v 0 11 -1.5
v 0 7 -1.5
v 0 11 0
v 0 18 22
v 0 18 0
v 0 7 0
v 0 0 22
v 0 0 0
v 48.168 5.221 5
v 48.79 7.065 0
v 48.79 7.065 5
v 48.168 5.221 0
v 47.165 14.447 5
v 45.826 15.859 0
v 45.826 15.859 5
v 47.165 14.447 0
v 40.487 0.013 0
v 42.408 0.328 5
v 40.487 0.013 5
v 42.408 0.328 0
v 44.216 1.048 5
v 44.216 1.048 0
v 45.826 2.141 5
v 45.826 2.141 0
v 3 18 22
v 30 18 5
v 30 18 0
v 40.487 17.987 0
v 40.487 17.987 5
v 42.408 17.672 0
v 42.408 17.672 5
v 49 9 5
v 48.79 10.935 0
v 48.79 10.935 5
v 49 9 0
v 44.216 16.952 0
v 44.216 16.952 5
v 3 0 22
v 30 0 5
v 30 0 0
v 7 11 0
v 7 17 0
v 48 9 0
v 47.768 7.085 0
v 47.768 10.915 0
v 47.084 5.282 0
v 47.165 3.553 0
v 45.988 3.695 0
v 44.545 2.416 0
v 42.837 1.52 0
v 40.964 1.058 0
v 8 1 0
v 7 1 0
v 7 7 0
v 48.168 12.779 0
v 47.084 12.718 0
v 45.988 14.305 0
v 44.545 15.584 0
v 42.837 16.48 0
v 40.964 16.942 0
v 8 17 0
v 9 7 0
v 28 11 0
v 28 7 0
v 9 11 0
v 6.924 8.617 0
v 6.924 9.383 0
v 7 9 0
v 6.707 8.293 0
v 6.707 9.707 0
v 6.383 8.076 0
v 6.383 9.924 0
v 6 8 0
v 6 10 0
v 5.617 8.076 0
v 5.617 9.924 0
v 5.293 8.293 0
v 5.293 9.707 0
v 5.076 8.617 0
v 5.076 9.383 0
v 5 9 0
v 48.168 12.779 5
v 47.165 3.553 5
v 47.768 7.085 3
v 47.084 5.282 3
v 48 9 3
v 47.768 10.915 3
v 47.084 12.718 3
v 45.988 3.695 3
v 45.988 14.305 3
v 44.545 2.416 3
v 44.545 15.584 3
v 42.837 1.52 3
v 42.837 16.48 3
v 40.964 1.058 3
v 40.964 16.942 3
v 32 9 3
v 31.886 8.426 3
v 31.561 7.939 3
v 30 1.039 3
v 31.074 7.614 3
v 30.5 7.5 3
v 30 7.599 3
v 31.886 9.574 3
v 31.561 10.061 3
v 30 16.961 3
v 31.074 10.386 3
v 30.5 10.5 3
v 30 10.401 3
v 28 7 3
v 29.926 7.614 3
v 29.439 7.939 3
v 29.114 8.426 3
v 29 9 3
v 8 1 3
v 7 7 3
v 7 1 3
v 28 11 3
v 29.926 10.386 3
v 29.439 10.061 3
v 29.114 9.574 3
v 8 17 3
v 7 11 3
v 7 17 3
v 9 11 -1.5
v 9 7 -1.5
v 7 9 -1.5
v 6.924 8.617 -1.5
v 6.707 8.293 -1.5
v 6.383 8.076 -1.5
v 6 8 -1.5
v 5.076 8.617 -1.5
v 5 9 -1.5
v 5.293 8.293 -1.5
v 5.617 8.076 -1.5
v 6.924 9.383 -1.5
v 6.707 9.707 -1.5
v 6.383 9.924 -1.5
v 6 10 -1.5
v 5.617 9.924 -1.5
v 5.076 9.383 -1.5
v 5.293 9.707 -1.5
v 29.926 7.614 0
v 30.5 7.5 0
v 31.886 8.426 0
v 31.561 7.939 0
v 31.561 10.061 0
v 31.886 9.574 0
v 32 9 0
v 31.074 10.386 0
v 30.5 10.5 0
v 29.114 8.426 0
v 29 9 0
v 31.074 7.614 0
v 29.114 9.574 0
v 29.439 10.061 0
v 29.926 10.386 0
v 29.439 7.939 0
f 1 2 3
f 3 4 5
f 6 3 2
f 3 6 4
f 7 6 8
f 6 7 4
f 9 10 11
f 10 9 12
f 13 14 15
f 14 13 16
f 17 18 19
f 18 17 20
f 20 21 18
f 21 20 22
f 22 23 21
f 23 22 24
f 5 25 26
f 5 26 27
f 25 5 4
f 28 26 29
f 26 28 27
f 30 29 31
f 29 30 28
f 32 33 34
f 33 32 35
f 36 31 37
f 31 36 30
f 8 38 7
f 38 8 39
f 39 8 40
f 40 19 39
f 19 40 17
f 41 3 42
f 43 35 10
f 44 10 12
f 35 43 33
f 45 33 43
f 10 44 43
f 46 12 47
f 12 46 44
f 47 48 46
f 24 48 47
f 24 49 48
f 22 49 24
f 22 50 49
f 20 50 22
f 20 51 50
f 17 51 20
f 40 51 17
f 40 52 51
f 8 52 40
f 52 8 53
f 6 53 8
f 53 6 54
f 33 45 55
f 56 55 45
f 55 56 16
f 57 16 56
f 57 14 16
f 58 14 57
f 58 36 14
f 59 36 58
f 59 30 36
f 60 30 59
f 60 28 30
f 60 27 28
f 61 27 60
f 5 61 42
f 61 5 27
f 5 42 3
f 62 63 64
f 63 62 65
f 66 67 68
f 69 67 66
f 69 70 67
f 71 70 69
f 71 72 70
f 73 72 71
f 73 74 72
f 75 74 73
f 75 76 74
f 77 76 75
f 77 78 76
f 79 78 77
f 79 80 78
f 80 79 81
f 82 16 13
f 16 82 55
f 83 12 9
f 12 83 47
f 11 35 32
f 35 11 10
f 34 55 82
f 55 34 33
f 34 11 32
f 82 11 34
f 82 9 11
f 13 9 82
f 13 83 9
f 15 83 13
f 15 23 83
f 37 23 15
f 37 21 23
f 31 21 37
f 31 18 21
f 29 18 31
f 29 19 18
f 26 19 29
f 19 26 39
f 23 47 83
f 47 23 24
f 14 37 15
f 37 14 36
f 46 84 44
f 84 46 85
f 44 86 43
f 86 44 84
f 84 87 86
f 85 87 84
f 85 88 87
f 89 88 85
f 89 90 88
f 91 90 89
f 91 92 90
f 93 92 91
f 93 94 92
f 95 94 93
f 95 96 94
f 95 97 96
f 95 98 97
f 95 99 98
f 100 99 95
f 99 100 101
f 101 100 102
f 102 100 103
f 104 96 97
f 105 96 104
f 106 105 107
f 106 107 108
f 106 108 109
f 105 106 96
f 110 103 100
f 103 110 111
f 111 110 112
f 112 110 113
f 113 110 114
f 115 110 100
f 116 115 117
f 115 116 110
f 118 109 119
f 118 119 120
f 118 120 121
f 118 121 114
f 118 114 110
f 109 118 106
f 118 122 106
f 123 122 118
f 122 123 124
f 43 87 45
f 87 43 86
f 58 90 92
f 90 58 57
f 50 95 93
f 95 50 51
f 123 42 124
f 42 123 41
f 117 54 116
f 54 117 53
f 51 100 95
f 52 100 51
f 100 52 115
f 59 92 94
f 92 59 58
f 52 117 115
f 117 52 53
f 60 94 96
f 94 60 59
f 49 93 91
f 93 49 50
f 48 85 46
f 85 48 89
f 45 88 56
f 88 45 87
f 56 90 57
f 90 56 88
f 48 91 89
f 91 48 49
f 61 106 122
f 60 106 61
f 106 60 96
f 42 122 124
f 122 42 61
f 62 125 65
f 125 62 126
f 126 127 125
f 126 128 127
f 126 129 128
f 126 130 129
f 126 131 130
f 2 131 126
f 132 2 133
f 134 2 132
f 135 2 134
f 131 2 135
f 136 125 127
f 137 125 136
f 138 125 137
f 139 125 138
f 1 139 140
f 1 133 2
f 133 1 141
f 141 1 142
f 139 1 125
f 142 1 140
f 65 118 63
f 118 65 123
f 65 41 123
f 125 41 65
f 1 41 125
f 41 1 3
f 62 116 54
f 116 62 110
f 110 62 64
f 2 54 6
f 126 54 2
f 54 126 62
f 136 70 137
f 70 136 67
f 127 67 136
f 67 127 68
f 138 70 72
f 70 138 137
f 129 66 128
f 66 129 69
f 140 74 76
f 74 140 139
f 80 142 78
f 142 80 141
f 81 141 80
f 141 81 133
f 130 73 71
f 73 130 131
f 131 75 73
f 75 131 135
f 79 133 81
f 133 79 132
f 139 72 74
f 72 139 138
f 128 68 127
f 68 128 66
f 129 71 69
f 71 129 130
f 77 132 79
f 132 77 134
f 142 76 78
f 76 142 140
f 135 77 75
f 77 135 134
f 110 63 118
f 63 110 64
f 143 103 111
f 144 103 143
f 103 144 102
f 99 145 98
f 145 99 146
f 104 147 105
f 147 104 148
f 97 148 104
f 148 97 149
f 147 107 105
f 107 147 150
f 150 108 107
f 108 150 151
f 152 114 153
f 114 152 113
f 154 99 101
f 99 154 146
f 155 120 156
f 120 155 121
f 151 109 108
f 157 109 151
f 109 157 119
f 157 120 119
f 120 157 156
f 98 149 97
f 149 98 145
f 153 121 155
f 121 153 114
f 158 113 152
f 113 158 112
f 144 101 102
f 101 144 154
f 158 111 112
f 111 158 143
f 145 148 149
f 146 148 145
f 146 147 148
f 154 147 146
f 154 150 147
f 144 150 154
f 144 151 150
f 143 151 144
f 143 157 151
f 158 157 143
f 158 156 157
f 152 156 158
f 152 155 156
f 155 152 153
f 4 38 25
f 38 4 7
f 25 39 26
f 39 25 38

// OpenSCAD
module windowStop() {
    module slope() {
        translate([0, 0, 3]) hull() {
            cube([3, 18, 19]);
            cube([30, 18, 2]);
        }
    }
    
    module base() {
        difference() {
            hull() {
                cube([30, 18, 5]);
                translate([40, 9, 0]) cylinder(d = 18, h = 5);
            }
            
            translate([0, 0, 0]) hull() {
                translate([7, 1, 0]) cube([1, 16, 3]);
                translate([40, 9, 0]) cylinder(d = 16, h = 3);
            }
        }
    }
    
    module details() {
        difference() {
            translate([0, 7, -1.5]) cube([9, 4, 1.5]);
            translate([6, 9, -1.5]) cylinder(d = 2, h = 2, $fn = 16);
        }
        
        translate([7, 7, 0]) cube([21, 4, 3]);
        translate([30.5, 9, 0]) cylinder(d = 3, h = 3, $fn = 16);
    }
    
    union() {
        slope();
        base();
        details();
    }
}

windowStop();
